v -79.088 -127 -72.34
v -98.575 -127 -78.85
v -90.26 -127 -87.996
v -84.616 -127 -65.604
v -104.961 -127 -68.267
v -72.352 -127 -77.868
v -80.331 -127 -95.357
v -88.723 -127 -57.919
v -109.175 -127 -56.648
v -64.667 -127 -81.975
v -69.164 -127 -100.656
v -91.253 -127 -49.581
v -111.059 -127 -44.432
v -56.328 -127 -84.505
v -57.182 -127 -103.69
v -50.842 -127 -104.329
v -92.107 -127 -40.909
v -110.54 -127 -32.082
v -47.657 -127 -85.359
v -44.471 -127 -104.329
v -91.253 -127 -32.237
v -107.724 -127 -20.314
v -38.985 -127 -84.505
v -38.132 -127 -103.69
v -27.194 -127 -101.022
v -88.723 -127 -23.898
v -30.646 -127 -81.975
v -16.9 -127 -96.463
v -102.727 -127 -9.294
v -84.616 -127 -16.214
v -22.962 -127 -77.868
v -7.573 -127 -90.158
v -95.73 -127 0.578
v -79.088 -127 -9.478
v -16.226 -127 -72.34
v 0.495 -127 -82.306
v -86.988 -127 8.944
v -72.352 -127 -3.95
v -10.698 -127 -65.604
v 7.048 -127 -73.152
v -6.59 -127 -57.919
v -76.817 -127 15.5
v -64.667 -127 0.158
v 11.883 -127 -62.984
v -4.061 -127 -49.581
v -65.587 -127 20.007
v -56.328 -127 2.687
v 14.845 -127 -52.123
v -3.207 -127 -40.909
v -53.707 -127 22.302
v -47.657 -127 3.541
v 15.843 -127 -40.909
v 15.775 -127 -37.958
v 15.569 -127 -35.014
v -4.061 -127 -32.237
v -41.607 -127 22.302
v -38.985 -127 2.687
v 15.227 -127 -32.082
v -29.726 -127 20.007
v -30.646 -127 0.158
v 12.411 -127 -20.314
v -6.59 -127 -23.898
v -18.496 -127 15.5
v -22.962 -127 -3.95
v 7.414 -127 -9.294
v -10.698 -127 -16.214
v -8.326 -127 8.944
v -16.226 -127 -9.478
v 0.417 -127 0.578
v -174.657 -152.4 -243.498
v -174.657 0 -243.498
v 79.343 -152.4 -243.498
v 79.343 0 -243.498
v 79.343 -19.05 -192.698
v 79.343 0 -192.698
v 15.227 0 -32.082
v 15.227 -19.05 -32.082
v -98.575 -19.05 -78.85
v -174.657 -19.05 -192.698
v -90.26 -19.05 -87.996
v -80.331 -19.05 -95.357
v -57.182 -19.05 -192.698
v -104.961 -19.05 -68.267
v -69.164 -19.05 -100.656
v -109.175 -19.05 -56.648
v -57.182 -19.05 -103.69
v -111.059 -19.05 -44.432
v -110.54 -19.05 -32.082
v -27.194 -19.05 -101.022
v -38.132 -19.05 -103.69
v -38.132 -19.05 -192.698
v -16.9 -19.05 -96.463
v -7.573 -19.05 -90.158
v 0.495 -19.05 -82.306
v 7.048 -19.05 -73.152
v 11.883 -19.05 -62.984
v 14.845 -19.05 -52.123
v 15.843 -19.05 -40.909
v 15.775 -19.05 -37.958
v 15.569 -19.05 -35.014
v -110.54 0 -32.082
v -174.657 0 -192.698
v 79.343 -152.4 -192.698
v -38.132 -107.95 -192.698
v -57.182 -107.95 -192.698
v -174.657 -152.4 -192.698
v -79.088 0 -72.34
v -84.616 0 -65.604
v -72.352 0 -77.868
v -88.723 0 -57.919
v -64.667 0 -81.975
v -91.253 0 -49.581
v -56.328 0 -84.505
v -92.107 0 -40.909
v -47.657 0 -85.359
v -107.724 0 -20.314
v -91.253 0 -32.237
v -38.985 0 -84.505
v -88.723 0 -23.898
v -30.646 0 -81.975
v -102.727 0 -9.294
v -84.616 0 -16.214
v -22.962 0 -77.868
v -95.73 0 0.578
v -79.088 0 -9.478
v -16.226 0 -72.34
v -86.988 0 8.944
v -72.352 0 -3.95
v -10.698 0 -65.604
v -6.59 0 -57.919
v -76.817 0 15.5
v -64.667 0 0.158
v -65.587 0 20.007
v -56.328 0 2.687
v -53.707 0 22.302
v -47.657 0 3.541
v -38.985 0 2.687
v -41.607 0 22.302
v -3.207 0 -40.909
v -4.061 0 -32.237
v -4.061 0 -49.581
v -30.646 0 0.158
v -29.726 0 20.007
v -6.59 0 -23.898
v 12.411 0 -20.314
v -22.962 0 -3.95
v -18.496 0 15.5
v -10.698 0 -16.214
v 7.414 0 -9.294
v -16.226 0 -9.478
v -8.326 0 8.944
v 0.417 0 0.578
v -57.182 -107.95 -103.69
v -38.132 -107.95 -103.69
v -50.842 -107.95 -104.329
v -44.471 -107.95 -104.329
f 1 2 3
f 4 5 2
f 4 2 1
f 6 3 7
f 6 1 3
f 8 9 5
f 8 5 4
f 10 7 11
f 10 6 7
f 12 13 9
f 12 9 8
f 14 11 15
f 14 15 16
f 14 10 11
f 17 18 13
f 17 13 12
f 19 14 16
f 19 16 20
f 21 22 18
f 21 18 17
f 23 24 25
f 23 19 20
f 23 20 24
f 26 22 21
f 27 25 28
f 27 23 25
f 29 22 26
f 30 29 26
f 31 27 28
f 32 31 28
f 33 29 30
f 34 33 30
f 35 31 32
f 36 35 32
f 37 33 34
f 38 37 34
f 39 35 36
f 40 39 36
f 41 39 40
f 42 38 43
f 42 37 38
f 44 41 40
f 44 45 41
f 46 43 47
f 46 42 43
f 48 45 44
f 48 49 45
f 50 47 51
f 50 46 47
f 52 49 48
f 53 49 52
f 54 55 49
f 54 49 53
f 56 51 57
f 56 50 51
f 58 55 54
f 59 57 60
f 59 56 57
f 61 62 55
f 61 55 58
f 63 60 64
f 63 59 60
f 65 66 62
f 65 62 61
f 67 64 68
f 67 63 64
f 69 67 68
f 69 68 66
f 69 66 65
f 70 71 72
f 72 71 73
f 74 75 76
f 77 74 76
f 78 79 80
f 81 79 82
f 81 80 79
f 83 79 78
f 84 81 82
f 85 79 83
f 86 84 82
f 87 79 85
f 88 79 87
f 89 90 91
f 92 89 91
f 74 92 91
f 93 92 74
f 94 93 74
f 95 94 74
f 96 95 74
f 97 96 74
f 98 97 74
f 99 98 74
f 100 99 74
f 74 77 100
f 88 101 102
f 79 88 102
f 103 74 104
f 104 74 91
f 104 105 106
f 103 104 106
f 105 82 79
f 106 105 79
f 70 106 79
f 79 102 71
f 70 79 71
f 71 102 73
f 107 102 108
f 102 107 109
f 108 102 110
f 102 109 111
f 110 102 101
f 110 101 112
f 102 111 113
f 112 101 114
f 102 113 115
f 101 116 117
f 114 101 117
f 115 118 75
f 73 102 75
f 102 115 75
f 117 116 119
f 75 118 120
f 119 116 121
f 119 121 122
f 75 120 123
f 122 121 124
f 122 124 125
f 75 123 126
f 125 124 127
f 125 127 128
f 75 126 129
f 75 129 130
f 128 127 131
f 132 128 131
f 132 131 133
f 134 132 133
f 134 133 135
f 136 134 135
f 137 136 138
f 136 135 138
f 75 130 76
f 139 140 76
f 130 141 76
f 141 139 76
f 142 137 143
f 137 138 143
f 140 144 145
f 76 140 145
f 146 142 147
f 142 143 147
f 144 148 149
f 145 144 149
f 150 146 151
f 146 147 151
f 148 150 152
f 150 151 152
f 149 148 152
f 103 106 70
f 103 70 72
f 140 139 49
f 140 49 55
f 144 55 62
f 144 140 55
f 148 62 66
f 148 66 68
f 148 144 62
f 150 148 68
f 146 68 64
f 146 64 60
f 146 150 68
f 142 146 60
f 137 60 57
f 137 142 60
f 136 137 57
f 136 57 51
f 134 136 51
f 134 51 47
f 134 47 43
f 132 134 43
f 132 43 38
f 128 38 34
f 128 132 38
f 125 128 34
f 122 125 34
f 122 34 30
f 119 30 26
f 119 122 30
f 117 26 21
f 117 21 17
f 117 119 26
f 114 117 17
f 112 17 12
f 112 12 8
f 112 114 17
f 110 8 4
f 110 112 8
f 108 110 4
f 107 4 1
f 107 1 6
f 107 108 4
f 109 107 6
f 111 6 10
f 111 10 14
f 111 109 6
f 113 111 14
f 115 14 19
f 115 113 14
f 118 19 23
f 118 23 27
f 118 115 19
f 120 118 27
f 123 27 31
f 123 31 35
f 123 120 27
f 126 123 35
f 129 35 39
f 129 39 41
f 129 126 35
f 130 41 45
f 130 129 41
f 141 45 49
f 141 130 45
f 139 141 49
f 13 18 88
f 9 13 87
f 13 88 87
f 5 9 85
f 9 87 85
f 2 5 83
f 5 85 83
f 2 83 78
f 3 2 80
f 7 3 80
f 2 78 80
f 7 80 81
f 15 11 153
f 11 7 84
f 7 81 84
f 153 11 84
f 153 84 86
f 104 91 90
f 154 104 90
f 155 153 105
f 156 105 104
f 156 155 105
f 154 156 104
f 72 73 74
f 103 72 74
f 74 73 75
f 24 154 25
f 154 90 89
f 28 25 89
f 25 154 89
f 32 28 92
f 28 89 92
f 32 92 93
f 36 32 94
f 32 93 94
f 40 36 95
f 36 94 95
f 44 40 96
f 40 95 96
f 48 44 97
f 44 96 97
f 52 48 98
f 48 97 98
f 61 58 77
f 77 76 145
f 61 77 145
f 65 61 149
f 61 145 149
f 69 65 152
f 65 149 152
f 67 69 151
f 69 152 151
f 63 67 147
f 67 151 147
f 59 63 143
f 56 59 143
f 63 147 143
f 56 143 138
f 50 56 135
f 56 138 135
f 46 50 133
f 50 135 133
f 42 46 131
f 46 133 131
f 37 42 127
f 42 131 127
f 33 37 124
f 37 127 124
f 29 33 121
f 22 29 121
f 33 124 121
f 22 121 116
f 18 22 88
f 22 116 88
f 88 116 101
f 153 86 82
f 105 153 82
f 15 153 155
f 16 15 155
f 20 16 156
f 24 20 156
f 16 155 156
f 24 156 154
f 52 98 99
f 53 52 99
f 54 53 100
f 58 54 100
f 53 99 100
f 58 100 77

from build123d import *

# Parameters (mm, degrees)
F1_DEPTH = 152.4
F2_DEPTH = 19.05
F0_R     = 44.45
F3_DEPTH = 127
F4_DEPTH = 107.95


with BuildPart() as f1:
    # F0 (on Front) → F1 (new body)
    with BuildSketch(Plane.XZ):
        Polygon((79.34329, -243.498236), (79.34329, -192.698236), (-38.13171, -192.698236), (-57.18171, -192.698236), (-174.65671, -192.698236), (-174.65671, -243.498236), align=None)
    extrude(amount=F1_DEPTH)

    # F0 (on Front) → F2 (join)
    with BuildSketch(Plane.XZ):
        with BuildLine():
            ThreePointArc((-57.18171, -103.690338), (-98.575122, -78.850381), (-110.540249, -32.082083))
            Line((-110.540249, -32.082083), (-174.65671, -192.698236))
            Line((-174.65671, -192.698236), (-57.18171, -192.698236))
            Line((-57.18171, -192.698236), (-57.18171, -103.690338))
        make_face()
        with BuildLine():
            ThreePointArc((15.226829, -32.082083), (15.688987, -36.48468), (15.84329, -40.908777))
            ThreePointArc((15.84329, -40.908777), (0.494549, -82.305712), (-38.13171, -103.690338))
            Line((-38.13171, -103.690338), (-38.13171, -192.698236))
            Line((-38.13171, -192.698236), (79.34329, -192.698236))
            Line((79.34329, -192.698236), (15.226829, -32.082083))
        make_face()
    extrude(amount=F2_DEPTH)

    # F0 (on Front) → F3 (join)
    with BuildSketch(Plane.XZ):
        with BuildLine():
            ThreePointArc((-38.13171, -103.690338), (0.494549, -82.305712), (15.84329, -40.908777))
            ThreePointArc((15.84329, -40.908777), (15.688987, -36.48468), (15.226829, -32.082083))
            ThreePointArc((15.226829, -32.082083), (-47.65671, 22.591223), (-110.540249, -32.082083))
            ThreePointArc((-110.540249, -32.082083), (-98.575122, -78.850381), (-57.18171, -103.690338))
            ThreePointArc((-57.18171, -103.690338), (-47.65671, -104.408777), (-38.13171, -103.690338))
        make_face()
        with Locations((-47.65671, -40.908777)):
            Circle(F0_R, mode=Mode.SUBTRACT)
    extrude(amount=F3_DEPTH)

    # F0 (on Front) → F4 (join)
    with BuildSketch(Plane.XZ):
        with BuildLine():
            Line((-38.13171, -192.698236), (-38.13171, -103.690338))
            ThreePointArc((-38.13171, -103.690338), (-47.65671, -104.408777), (-57.18171, -103.690338))
            Line((-57.18171, -103.690338), (-57.18171, -192.698236))
            Line((-57.18171, -192.698236), (-38.13171, -192.698236))
        make_face()
    extrude(amount=F4_DEPTH)


solid = f1.part
